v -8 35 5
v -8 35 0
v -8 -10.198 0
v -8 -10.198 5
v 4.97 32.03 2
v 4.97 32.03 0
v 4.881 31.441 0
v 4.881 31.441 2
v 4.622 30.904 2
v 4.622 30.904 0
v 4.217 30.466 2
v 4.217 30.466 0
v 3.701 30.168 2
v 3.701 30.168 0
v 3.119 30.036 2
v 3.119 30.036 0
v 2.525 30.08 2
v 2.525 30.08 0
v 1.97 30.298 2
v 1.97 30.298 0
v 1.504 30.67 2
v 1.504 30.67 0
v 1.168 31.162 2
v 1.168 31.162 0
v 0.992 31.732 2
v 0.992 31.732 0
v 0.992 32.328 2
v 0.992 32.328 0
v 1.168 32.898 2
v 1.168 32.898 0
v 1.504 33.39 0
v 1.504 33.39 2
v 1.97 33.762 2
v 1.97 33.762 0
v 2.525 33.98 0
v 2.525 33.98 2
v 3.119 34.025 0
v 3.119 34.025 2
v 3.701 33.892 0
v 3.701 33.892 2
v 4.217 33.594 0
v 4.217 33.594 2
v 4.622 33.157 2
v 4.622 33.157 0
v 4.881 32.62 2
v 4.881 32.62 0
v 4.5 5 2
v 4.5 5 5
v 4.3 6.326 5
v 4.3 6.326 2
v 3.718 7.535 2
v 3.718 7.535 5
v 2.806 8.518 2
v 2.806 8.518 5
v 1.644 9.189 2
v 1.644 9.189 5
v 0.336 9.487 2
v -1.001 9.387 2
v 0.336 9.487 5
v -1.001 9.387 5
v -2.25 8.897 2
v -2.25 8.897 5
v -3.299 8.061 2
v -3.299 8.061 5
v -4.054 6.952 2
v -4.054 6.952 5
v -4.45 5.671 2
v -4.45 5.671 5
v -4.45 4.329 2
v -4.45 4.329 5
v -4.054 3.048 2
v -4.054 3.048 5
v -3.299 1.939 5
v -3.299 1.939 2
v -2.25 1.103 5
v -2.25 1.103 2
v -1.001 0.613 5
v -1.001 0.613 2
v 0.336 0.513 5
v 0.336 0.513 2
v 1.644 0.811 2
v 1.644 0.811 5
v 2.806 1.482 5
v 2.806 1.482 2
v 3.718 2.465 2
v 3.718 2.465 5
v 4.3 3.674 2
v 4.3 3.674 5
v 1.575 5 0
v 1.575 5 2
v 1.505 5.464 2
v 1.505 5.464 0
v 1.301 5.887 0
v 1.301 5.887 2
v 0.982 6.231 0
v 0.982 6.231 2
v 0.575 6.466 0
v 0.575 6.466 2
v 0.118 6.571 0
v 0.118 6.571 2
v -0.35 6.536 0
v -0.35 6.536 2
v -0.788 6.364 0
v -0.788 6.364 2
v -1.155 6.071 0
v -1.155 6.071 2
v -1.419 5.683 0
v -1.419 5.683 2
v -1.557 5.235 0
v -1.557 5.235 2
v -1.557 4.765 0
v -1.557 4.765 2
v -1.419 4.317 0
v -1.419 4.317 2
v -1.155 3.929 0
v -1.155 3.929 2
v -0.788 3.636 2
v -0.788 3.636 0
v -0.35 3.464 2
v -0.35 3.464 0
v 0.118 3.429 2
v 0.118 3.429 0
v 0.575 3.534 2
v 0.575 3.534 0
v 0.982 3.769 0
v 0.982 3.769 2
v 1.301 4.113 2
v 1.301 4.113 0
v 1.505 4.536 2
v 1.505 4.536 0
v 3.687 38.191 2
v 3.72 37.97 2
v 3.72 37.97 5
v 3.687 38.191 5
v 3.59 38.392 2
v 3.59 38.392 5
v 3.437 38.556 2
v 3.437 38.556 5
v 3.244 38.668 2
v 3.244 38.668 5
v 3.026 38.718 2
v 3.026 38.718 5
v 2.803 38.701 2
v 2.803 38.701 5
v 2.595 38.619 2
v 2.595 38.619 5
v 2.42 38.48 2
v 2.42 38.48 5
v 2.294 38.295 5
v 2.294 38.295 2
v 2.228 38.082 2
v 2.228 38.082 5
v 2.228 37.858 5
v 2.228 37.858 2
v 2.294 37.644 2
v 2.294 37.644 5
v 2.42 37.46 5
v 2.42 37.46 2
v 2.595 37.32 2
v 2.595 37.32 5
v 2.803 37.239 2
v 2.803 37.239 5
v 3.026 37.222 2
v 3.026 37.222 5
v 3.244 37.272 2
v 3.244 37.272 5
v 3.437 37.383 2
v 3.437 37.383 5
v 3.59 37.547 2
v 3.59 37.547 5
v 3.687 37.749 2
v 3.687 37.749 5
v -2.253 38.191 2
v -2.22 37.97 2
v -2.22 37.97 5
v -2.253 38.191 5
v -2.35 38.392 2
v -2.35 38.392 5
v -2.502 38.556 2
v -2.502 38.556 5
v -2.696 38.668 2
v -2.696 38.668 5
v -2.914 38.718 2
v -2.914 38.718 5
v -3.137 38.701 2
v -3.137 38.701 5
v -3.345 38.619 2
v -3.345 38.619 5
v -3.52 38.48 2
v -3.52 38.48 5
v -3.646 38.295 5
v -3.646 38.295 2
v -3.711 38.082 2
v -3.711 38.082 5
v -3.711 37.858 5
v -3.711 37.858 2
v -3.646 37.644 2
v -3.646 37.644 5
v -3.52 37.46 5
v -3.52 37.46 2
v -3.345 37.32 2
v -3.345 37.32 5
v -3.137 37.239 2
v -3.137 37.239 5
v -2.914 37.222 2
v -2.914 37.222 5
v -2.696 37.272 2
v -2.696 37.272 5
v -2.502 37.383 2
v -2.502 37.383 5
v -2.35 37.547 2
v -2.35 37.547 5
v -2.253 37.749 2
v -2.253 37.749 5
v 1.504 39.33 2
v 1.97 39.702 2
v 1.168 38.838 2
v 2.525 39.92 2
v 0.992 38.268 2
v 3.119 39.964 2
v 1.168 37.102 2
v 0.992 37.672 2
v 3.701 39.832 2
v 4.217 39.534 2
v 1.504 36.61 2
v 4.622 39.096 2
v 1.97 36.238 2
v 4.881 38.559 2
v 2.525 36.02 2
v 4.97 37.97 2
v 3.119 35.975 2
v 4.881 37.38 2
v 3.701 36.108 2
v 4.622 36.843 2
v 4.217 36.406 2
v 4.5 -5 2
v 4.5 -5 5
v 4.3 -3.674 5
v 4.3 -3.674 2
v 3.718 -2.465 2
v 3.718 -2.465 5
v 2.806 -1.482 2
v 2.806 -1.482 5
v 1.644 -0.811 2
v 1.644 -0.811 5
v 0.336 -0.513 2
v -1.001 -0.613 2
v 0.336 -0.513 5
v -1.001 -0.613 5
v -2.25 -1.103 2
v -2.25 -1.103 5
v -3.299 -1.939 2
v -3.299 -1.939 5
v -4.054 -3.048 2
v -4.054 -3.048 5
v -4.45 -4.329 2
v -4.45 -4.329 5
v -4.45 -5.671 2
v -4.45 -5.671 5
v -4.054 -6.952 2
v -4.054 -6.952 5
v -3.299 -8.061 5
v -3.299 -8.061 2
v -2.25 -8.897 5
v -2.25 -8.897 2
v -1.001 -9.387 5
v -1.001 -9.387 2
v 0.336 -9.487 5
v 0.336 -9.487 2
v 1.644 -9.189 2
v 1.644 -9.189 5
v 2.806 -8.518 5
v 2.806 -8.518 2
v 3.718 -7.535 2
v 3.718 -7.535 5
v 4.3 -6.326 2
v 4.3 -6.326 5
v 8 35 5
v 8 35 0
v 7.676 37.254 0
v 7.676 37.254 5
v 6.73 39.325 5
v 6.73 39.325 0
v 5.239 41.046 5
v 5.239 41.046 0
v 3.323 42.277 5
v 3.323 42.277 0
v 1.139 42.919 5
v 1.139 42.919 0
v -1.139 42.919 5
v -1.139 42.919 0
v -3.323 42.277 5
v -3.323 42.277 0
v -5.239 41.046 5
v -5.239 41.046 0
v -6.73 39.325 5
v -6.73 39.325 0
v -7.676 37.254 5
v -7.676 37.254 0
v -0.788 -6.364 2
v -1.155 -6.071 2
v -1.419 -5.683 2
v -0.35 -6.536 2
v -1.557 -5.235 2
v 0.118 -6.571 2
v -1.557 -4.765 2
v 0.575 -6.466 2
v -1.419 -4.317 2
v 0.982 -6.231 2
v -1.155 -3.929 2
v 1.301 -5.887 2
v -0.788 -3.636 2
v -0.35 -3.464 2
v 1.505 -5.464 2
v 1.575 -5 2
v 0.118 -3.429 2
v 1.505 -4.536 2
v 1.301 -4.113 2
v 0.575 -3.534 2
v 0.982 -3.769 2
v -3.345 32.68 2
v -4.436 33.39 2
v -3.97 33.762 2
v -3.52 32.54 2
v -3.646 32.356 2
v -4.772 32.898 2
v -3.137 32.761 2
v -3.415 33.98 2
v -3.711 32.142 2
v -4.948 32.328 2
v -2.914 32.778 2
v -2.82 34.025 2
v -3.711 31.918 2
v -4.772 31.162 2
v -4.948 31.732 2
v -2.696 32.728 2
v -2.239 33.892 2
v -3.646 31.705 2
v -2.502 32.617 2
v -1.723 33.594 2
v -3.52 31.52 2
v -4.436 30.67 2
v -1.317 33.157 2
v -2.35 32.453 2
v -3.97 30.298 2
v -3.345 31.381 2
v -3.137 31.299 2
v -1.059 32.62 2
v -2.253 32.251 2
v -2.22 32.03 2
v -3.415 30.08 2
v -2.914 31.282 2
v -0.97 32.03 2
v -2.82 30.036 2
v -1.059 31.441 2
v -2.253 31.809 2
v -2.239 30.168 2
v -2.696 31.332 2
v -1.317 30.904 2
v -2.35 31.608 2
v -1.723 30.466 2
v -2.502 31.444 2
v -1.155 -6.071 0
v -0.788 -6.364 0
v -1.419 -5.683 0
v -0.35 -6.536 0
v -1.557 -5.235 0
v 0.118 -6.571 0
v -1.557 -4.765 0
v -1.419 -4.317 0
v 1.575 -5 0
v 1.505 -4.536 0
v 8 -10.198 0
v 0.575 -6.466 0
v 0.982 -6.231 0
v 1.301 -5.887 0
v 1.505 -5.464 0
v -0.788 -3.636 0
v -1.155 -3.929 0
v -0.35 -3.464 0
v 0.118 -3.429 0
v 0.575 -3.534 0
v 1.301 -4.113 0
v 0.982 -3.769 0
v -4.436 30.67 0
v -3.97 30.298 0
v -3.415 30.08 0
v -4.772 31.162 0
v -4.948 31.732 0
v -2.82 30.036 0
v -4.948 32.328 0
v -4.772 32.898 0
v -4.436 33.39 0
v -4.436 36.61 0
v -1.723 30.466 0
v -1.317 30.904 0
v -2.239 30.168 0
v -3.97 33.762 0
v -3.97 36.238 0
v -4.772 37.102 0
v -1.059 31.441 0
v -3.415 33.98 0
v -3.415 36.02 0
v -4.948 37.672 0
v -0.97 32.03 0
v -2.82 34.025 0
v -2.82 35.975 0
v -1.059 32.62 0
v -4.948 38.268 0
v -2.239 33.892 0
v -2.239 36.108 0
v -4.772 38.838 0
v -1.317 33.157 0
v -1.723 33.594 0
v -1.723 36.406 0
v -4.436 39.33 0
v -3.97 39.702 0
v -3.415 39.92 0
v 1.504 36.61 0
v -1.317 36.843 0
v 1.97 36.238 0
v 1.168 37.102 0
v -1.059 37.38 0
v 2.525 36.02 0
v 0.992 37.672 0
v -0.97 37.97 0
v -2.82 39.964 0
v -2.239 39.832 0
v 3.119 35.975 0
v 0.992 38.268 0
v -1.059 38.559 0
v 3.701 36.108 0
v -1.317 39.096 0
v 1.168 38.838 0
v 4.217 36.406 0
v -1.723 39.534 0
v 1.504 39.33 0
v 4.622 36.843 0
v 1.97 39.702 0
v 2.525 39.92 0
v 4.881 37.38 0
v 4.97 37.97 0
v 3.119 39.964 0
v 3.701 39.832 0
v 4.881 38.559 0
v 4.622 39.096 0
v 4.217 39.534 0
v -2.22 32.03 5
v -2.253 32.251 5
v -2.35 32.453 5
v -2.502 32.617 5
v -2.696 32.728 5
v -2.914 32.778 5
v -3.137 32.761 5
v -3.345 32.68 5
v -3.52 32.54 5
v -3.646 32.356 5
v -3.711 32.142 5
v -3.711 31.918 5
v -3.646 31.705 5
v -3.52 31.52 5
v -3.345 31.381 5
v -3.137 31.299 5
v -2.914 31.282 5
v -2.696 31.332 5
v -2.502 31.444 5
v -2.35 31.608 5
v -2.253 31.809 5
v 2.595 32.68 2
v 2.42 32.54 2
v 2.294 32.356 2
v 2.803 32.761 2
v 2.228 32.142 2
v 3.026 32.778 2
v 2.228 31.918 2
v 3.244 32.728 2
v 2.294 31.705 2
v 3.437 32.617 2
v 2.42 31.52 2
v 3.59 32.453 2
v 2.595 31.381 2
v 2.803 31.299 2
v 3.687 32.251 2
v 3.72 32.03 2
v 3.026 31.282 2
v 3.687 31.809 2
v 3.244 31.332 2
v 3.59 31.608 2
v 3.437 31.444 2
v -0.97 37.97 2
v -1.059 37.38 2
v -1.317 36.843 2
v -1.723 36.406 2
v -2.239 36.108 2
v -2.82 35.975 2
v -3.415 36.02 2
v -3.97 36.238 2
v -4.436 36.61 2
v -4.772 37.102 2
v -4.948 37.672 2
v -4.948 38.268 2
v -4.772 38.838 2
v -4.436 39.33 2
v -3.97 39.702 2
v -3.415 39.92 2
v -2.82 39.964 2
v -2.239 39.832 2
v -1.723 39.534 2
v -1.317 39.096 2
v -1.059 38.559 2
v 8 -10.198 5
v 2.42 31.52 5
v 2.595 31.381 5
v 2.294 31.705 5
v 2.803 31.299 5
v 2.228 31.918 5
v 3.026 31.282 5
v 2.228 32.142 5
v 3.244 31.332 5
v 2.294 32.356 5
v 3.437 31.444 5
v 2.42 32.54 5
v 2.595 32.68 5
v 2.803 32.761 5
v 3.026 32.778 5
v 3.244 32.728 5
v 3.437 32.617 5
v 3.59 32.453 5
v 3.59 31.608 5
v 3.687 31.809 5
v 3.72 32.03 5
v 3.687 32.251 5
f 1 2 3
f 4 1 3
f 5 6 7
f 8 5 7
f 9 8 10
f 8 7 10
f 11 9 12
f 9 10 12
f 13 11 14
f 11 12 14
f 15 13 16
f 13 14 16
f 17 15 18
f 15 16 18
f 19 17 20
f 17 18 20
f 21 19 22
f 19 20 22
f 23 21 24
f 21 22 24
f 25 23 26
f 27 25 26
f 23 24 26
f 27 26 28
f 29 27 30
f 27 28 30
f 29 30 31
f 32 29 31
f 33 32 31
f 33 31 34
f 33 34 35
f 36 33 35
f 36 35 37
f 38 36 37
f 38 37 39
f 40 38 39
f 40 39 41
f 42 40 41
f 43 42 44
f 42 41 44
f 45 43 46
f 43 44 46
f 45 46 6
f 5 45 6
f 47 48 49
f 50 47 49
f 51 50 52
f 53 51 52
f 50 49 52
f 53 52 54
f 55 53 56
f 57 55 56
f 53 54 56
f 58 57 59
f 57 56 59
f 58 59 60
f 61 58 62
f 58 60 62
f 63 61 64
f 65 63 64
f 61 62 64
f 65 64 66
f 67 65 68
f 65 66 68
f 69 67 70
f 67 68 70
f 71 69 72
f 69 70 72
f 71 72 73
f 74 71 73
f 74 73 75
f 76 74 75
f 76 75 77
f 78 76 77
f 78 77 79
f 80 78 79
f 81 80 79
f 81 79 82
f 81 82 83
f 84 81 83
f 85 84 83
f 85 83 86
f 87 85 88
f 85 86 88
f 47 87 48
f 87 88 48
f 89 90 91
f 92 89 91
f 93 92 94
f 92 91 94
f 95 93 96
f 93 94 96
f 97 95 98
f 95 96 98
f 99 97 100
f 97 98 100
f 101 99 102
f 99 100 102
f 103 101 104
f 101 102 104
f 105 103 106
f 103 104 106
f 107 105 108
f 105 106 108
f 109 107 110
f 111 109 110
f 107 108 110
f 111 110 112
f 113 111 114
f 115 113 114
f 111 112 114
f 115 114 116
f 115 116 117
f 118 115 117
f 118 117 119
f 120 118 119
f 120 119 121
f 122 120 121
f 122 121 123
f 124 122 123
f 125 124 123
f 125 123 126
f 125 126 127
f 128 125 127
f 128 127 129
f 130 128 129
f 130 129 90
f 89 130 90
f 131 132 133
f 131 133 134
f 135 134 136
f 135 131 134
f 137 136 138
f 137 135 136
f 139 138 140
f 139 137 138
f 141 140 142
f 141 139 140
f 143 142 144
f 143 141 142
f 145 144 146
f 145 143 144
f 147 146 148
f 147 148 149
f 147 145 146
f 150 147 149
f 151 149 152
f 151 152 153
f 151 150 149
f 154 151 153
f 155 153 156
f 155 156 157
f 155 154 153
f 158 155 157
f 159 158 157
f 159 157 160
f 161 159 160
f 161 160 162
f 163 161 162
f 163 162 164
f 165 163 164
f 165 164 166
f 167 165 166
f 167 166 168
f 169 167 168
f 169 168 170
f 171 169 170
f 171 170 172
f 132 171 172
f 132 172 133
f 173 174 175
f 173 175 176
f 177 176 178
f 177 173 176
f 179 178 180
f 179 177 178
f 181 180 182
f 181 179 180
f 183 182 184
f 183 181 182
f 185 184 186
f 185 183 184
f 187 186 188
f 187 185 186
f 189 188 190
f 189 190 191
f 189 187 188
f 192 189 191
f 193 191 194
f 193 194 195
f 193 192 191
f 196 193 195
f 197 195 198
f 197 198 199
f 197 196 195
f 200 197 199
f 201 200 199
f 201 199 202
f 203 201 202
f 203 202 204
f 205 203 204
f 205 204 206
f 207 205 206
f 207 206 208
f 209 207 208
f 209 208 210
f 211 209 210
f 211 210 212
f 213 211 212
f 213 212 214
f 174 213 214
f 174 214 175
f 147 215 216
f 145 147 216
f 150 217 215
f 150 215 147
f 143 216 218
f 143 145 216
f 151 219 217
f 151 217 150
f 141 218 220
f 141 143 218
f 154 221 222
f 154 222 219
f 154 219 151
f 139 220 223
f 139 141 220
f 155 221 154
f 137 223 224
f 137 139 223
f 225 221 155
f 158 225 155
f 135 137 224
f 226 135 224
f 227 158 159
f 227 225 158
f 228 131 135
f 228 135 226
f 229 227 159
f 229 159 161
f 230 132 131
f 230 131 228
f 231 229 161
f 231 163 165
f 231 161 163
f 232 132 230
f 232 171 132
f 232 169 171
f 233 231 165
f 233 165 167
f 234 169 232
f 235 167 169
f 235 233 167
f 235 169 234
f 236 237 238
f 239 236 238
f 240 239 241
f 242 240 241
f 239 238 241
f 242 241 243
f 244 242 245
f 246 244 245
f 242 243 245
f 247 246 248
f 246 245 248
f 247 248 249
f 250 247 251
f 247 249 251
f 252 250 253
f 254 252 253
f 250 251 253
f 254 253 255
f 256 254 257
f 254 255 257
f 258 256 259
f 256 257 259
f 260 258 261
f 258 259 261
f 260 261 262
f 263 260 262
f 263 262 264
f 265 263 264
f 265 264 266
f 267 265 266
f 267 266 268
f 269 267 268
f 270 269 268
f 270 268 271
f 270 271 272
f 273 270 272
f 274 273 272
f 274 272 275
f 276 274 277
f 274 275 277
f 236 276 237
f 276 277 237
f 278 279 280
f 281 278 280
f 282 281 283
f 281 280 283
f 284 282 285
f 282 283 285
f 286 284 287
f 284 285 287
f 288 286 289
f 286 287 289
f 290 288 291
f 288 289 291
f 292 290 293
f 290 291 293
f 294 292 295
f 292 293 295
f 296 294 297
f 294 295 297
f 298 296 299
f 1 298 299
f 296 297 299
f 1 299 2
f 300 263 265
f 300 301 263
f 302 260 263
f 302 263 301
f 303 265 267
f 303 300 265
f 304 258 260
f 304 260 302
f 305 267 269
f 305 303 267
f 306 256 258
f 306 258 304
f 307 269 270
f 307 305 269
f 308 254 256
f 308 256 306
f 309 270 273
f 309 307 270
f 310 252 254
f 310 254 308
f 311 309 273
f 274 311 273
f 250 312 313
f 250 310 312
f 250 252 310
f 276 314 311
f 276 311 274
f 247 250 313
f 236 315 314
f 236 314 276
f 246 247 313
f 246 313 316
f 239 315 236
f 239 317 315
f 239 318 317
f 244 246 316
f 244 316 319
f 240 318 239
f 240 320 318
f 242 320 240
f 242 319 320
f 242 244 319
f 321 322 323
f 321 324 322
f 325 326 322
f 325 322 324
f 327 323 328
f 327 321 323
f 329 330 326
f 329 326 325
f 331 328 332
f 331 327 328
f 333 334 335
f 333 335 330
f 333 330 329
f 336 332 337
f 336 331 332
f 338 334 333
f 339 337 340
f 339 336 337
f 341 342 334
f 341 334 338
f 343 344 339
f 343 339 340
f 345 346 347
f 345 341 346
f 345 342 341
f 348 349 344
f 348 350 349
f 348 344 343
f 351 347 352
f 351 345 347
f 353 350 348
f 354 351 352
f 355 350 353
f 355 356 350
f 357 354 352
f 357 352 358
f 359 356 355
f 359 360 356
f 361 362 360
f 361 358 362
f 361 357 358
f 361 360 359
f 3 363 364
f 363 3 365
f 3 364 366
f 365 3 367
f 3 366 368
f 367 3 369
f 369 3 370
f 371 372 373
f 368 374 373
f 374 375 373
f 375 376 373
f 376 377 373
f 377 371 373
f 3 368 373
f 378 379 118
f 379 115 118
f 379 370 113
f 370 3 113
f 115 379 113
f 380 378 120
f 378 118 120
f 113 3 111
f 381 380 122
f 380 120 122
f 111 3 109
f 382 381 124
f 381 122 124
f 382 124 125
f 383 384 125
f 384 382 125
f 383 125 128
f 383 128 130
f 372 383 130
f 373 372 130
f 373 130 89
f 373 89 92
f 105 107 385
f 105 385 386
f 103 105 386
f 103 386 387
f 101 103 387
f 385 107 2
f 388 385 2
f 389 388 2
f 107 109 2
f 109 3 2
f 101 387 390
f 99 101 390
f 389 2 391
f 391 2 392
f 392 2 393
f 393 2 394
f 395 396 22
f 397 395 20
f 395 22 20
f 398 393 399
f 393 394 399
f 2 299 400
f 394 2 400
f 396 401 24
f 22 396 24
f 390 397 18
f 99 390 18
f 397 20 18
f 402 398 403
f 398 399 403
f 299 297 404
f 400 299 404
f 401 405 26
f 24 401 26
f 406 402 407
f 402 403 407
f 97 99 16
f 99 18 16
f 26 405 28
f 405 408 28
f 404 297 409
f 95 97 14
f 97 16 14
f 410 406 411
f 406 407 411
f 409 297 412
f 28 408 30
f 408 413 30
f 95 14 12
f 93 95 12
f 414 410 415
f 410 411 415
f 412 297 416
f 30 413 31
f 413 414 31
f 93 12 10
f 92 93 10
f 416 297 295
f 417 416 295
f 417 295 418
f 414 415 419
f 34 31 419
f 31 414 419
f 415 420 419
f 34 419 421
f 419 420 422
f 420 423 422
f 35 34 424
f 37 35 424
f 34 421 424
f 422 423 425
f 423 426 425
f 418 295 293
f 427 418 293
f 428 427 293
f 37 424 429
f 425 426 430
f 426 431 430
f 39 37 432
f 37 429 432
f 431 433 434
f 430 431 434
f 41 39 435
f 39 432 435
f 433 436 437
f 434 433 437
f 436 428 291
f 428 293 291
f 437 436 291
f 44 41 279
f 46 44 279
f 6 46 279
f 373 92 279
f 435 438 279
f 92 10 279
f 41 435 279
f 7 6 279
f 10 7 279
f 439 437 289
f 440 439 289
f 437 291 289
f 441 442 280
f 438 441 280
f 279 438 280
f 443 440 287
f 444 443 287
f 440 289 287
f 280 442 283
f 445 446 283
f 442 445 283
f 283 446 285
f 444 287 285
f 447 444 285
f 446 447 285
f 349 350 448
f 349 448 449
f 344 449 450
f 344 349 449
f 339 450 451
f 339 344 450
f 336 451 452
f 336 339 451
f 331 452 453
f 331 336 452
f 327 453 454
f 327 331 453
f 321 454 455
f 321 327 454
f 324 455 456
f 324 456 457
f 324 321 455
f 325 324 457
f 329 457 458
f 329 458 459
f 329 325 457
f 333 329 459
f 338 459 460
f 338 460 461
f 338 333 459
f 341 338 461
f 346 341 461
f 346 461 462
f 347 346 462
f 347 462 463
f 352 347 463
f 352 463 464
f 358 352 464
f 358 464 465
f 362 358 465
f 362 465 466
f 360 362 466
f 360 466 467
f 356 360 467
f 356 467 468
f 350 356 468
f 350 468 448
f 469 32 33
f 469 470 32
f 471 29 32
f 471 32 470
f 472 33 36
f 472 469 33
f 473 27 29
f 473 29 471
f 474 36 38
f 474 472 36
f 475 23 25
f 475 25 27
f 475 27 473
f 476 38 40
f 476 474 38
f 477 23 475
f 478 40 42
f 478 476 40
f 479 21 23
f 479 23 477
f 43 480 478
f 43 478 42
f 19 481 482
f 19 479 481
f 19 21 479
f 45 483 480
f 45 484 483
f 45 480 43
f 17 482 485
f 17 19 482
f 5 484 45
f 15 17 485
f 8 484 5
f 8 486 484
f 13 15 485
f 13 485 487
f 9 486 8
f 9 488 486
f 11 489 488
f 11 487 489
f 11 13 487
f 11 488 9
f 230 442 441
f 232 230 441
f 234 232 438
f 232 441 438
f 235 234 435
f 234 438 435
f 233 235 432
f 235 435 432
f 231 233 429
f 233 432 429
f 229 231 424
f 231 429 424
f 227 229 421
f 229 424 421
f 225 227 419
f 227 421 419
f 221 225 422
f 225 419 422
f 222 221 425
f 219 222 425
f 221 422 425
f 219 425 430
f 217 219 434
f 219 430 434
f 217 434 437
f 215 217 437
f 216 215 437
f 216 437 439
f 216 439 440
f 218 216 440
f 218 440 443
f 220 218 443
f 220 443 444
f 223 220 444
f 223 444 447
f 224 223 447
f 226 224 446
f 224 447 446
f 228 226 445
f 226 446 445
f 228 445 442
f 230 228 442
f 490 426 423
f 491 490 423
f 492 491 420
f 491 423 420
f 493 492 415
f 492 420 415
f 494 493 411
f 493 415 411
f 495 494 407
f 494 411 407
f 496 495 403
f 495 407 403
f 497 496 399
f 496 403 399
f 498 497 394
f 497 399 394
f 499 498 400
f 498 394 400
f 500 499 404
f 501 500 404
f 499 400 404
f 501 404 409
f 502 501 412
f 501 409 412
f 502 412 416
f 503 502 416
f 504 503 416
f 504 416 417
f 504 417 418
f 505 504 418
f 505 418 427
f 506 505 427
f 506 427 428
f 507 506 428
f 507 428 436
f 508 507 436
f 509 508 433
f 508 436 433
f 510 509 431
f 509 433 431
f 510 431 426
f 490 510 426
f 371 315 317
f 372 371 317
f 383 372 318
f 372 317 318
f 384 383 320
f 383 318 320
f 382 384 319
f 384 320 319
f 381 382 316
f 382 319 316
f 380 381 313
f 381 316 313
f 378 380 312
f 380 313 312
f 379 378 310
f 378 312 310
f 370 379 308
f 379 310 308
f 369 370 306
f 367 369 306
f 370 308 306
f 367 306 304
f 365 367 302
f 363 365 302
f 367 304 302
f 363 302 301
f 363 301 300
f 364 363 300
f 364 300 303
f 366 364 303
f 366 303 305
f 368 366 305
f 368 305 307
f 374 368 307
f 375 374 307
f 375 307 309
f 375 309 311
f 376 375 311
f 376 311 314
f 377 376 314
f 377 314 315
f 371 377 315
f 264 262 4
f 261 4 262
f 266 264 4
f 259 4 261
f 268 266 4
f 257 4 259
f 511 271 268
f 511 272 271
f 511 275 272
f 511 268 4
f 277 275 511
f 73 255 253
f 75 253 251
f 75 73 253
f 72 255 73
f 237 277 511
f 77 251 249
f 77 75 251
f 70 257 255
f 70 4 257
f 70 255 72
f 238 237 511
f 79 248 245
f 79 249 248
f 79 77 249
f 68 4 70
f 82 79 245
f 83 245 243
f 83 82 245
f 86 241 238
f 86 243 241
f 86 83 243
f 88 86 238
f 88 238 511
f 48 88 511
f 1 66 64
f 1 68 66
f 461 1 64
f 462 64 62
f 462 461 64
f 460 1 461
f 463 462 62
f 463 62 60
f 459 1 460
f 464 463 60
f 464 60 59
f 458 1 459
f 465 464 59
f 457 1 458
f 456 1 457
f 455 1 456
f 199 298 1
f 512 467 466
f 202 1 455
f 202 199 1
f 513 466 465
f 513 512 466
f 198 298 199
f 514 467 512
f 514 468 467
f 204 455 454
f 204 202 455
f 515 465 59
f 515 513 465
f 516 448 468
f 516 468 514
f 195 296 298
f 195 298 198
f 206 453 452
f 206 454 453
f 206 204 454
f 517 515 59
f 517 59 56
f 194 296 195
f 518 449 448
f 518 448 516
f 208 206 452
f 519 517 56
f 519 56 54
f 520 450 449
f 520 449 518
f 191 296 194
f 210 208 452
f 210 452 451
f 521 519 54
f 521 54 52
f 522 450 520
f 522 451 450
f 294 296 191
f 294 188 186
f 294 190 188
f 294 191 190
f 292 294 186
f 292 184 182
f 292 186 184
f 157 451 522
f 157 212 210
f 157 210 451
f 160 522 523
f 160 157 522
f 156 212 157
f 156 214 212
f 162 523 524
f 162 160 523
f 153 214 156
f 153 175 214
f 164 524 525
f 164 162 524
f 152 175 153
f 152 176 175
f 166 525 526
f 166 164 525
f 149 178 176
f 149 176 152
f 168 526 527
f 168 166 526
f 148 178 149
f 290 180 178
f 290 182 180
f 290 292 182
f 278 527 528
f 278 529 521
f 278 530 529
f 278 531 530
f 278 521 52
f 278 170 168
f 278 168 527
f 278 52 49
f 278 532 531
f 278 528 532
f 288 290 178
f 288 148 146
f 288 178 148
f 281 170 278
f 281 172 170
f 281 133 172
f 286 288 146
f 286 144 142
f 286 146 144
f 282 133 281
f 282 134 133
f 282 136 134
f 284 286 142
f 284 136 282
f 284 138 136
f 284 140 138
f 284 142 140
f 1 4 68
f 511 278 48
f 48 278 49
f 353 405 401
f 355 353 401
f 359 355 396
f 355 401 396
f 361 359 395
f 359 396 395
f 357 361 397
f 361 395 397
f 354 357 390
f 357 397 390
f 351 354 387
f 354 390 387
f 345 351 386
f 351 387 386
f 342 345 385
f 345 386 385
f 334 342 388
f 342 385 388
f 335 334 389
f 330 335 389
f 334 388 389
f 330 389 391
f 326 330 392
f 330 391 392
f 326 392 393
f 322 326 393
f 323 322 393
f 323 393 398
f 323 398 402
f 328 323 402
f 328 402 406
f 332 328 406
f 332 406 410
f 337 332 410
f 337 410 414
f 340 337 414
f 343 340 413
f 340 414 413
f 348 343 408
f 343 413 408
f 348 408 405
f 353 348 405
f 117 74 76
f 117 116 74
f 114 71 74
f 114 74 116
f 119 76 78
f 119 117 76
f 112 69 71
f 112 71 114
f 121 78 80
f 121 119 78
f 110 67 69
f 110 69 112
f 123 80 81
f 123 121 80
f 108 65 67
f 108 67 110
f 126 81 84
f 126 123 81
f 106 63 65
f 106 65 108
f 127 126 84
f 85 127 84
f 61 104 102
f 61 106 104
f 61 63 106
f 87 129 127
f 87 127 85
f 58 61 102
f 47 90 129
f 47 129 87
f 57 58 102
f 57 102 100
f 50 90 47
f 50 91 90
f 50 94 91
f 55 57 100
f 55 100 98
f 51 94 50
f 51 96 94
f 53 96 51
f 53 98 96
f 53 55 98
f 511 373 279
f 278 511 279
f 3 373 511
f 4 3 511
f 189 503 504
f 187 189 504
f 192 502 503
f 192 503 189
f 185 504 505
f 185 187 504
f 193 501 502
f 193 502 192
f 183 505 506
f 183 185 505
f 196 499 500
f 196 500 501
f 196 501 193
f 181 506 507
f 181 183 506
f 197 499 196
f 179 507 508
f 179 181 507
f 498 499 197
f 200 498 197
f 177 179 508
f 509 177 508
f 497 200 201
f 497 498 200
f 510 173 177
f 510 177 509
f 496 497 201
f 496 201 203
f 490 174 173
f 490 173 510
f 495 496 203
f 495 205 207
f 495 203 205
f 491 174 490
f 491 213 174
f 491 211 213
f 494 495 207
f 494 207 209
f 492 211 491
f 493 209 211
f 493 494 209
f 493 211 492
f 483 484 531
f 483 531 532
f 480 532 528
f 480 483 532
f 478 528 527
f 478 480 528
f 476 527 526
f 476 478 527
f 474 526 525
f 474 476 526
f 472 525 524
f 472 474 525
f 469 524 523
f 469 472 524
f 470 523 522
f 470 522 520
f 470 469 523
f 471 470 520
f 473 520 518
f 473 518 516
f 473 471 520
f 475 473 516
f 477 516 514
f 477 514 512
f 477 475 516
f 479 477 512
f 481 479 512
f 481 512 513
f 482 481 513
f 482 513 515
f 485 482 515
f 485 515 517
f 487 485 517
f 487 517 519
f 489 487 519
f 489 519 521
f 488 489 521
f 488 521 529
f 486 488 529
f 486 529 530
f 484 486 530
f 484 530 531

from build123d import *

# Parameters (mm, degrees)
F0_R     = 0.75
F1_DEPTH = 5
F2_R     = 1.575
F3_DEPTH = 5.001
F4_R     = 4.5
F5_DEPTH = 3
F6_R     = 2
F7_DEPTH = 2
F8_W     = 43.103866
F8_H     = 7.897038
F9_DEPTH = 16.001


with BuildPart() as f1:
    # F0 (on Top) → F1 (new body)
    with BuildSketch(Plane.XY):
        with BuildLine():
            Line((-8, 35), (-8, 0))
            Line((-8, 0), (-8, -35))
            ThreePointArc((-8, -35), (0, -43), (8, -35))
            Line((8, -35), (8, 0))
            Line((8, 0), (8, 35))
            ThreePointArc((8, 35), (0, 43), (-8, 35))
        make_face()
        with Locations((-2.969848, -37.969848)):
            Circle(F0_R, mode=Mode.SUBTRACT)
        with Locations((-2.969848, -32.030152)):
            Circle(F0_R, mode=Mode.SUBTRACT)
        with Locations((2.969848, -37.969848)):
            Circle(F0_R, mode=Mode.SUBTRACT)
        with Locations((2.969848, -32.030152)):
            Circle(F0_R, mode=Mode.SUBTRACT)
        with Locations((-2.969848, 32.030152)):
            Circle(F0_R, mode=Mode.SUBTRACT)
        with Locations((-2.969848, 37.969848)):
            Circle(F0_R, mode=Mode.SUBTRACT)
        with Locations((2.969848, 32.030152)):
            Circle(F0_R, mode=Mode.SUBTRACT)
        with Locations((2.969848, 37.969848)):
            Circle(F0_R, mode=Mode.SUBTRACT)
    extrude(amount=F1_DEPTH)

    # F2 (on face) → F3 (cut, through all)
    with BuildSketch(Plane.XY.offset(5)):
        with Locations((0, 5)):
            Circle(F2_R)
        with Locations((0, -5)):
            Circle(F2_R)
    extrude(amount=-F3_DEPTH, mode=Mode.SUBTRACT)

    # F4 (on face) → F5 (cut)
    with BuildSketch(Plane.XY.offset(5)):
        with Locations((0, 5)):
            Circle(F4_R)
        with Locations((0, -5)):
            Circle(F4_R)
    extrude(amount=-F5_DEPTH, mode=Mode.SUBTRACT)

    # F6 (on face) → F7 (cut)
    with BuildSketch(Plane(origin=(0, 0, 0), x_dir=(1, 0, 0), z_dir=(0, 0, -1))):
        with Locations((-2.969848, 37.969848)):
            Circle(F6_R)
        with Locations((2.969848, 37.969848)):
            Circle(F6_R)
        with Locations((2.969848, 32.030152)):
            Circle(F6_R)
        with Locations((-2.969848, 32.030152)):
            Circle(F6_R)
        with Locations((-2.969848, -32.030152)):
            Circle(F6_R)
        with Locations((-2.969848, -37.969848)):
            Circle(F6_R)
        with Locations((2.969848, -37.969848)):
            Circle(F6_R)
        with Locations((2.969848, -32.030152)):
            Circle(F6_R)
    extrude(amount=-F7_DEPTH, mode=Mode.SUBTRACT)

    # F8 (on face) → F9 (cut, through all)
    with BuildSketch(Plane.YZ.offset(8)):
        with Locations((-31.750295, 3.948519)):
            Rectangle(F8_W, F8_H)
    extrude(amount=-F9_DEPTH, mode=Mode.SUBTRACT)


solid = f1.part
